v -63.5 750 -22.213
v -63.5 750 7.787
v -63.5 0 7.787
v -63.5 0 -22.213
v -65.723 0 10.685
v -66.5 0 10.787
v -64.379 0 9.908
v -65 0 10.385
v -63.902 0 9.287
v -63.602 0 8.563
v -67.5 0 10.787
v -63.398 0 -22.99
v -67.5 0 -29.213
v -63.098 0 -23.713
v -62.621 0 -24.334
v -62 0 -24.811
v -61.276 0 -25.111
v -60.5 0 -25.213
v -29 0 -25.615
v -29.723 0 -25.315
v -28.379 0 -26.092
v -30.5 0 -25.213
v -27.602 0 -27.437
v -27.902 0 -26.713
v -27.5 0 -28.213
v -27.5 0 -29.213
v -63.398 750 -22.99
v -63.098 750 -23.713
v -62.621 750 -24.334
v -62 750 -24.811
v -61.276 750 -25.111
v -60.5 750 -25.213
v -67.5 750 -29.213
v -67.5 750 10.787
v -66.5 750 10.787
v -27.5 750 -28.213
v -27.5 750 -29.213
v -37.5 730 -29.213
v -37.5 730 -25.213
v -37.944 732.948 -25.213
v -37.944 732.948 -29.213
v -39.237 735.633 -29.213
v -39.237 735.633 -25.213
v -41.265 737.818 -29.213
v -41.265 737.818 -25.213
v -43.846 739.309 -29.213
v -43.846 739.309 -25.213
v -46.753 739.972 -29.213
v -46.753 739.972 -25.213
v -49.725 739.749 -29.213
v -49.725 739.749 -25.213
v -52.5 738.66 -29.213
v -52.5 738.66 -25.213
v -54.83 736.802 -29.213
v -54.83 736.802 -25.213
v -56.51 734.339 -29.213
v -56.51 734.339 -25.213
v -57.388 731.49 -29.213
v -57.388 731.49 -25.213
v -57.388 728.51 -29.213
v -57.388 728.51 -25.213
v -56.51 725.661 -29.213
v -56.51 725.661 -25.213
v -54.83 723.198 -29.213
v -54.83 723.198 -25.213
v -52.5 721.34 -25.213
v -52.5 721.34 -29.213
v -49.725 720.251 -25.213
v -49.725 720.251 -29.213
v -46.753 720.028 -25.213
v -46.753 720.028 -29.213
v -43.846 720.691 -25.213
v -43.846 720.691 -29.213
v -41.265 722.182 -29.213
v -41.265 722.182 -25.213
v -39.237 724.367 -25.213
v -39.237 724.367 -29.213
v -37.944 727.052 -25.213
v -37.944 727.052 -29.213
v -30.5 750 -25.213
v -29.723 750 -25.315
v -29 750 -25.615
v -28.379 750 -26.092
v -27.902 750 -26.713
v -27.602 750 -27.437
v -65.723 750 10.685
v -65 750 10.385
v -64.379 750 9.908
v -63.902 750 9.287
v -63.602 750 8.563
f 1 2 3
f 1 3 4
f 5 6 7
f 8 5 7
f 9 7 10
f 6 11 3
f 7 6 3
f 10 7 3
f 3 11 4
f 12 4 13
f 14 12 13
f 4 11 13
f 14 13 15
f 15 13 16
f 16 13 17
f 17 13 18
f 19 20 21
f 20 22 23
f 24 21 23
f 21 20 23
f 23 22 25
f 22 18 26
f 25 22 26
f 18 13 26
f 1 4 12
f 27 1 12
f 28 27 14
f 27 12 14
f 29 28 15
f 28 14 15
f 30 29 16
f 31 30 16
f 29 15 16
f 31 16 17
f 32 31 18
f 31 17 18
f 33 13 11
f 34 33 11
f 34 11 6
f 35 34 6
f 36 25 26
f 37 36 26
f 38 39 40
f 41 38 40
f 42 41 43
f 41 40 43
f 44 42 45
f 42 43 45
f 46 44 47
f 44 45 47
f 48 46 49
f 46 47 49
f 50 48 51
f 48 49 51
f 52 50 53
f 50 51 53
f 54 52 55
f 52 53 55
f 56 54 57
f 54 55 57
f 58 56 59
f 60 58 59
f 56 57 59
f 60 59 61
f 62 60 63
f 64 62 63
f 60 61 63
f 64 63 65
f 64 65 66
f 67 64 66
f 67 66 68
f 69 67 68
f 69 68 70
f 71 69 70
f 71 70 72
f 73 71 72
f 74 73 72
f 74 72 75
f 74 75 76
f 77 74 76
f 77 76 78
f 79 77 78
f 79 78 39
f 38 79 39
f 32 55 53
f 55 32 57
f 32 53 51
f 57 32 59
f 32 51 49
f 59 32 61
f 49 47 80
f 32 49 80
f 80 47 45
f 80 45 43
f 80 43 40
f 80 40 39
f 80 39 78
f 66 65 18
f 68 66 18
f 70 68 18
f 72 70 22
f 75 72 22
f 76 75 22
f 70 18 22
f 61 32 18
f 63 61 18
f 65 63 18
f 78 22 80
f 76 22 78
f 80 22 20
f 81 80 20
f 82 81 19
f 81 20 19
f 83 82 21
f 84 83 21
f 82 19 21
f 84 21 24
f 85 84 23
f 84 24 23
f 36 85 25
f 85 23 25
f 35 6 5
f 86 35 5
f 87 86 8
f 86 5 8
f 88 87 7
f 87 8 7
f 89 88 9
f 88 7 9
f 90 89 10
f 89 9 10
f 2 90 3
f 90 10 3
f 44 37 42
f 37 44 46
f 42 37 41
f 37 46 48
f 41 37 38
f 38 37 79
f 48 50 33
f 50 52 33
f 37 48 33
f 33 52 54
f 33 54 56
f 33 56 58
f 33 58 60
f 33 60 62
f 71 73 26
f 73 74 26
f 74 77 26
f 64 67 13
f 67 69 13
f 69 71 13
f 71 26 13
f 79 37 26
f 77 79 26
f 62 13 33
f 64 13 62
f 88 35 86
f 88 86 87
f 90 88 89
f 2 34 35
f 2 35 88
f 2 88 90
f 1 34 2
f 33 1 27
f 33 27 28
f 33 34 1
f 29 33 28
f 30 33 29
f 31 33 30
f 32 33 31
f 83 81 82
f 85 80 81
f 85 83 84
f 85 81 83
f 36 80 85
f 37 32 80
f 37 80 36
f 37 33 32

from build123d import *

# Parameters (mm, degrees)
BOSS_EXTRUDE1_DEPTH = 750
SKETCH2_R           = 10
CUT_EXTRUDE1_DEPTH  = 754.891393199


with BuildPart() as part:
    # Sketch1 → Boss-Extrude1 (new body)
    with BuildSketch(Plane(origin=(0, 0, 0), x_dir=(1, 0, 0), z_dir=(0, 1, 0))):
        with BuildLine():
            Line((-27.499872145, 29.213153277), (-67.499872145, 29.213153277))
            Line((-67.499872145, 29.213153277), (-67.499872145, -10.786846723))
            Line((-67.499872145, -10.786846723), (-66.499872145, -10.786846723))
            ThreePointArc((-66.499872145, -10.786846723), (-64.378551801, -9.908167067), (-63.499872145, -7.786846723))
            Line((-63.499872145, -7.786846723), (-63.499872145, 22.213153277))
            ThreePointArc((-63.499872145, 22.213153277), (-62.621192489, 24.334473621), (-60.499872145, 25.213153277))
            Line((-60.499872145, 25.213153277), (-30.499872145, 25.213153277))
            ThreePointArc((-30.499872145, 25.213153277), (-28.378551801, 26.091832933), (-27.499872145, 28.213153277))
            Line((-27.499872145, 28.213153277), (-27.499872145, 29.213153277))
        make_face()
    extrude(amount=BOSS_EXTRUDE1_DEPTH)

    # Sketch2 → Cut-Extrude1 (cut, through all)
    with BuildSketch(Plane.XY.offset(-25.213153277)):
        with Locations((-47.499872145, 730)):
            Circle(SKETCH2_R)
    extrude(amount=-CUT_EXTRUDE1_DEPTH, mode=Mode.SUBTRACT)


solid = part.part
